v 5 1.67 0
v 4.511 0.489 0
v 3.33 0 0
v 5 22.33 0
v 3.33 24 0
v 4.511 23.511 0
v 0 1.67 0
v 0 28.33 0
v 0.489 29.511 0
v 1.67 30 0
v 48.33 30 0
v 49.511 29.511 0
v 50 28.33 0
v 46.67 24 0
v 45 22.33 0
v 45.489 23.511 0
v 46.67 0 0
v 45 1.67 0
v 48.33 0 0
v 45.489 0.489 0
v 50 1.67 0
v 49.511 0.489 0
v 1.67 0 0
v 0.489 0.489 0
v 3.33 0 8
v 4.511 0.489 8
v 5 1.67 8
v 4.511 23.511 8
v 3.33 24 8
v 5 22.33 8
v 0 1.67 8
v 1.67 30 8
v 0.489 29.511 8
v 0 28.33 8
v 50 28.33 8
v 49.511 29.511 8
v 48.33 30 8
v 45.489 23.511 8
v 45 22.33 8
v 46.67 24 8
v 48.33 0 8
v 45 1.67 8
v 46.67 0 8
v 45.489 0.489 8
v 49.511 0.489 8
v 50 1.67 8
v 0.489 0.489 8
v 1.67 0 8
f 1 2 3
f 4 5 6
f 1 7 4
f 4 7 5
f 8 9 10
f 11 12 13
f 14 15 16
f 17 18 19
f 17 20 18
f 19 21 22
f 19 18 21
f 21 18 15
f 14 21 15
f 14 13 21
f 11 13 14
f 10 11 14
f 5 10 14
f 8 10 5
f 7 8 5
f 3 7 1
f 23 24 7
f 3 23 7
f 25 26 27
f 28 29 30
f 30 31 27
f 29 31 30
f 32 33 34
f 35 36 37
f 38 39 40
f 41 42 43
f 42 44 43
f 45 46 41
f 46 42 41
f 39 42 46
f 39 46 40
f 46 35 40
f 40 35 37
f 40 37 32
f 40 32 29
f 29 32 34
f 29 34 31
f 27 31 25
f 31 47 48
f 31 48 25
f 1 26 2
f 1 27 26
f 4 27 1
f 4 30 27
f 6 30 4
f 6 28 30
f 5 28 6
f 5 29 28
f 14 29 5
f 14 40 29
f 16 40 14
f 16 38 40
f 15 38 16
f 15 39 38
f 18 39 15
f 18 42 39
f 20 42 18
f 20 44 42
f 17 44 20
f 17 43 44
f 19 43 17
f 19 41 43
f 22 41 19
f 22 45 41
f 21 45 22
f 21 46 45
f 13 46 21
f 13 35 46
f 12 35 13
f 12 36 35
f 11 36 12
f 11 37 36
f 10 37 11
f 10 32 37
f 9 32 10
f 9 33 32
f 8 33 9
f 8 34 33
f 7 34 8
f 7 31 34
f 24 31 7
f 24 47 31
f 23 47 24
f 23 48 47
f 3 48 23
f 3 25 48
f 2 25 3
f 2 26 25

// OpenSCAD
$fn = 32;

// ----------------------------------------------------------------------
// Clip blank: staple clip, 8 mm thick
// ----------------------------------------------------------------------

// --- parameters (mm) ---
profile_height = 8;       // extrusion height
profile_points = 24;      // points of the closed outline

profile = [[0, 1.67], [0.489, 0.489], [1.67, 0], [3.33, 0], [4.511, 0.489], [5, 1.67], [5, 22.33], [4.511, 23.511], [3.33, 24], [46.67, 24], [45.489, 23.511], [45, 22.33], [45, 1.67], [45.489, 0.489], [46.67, 0], [48.33, 0], [49.511, 0.489], [50, 1.67], [50, 28.33], [49.511, 29.511], [48.33, 30], [1.67, 30], [0.489, 29.511], [0, 28.33]];  // single closed polygon, 24 points, counter clockwise

// --- the one profile operation ---
linear_extrude(height = profile_height) polygon(points = profile);
